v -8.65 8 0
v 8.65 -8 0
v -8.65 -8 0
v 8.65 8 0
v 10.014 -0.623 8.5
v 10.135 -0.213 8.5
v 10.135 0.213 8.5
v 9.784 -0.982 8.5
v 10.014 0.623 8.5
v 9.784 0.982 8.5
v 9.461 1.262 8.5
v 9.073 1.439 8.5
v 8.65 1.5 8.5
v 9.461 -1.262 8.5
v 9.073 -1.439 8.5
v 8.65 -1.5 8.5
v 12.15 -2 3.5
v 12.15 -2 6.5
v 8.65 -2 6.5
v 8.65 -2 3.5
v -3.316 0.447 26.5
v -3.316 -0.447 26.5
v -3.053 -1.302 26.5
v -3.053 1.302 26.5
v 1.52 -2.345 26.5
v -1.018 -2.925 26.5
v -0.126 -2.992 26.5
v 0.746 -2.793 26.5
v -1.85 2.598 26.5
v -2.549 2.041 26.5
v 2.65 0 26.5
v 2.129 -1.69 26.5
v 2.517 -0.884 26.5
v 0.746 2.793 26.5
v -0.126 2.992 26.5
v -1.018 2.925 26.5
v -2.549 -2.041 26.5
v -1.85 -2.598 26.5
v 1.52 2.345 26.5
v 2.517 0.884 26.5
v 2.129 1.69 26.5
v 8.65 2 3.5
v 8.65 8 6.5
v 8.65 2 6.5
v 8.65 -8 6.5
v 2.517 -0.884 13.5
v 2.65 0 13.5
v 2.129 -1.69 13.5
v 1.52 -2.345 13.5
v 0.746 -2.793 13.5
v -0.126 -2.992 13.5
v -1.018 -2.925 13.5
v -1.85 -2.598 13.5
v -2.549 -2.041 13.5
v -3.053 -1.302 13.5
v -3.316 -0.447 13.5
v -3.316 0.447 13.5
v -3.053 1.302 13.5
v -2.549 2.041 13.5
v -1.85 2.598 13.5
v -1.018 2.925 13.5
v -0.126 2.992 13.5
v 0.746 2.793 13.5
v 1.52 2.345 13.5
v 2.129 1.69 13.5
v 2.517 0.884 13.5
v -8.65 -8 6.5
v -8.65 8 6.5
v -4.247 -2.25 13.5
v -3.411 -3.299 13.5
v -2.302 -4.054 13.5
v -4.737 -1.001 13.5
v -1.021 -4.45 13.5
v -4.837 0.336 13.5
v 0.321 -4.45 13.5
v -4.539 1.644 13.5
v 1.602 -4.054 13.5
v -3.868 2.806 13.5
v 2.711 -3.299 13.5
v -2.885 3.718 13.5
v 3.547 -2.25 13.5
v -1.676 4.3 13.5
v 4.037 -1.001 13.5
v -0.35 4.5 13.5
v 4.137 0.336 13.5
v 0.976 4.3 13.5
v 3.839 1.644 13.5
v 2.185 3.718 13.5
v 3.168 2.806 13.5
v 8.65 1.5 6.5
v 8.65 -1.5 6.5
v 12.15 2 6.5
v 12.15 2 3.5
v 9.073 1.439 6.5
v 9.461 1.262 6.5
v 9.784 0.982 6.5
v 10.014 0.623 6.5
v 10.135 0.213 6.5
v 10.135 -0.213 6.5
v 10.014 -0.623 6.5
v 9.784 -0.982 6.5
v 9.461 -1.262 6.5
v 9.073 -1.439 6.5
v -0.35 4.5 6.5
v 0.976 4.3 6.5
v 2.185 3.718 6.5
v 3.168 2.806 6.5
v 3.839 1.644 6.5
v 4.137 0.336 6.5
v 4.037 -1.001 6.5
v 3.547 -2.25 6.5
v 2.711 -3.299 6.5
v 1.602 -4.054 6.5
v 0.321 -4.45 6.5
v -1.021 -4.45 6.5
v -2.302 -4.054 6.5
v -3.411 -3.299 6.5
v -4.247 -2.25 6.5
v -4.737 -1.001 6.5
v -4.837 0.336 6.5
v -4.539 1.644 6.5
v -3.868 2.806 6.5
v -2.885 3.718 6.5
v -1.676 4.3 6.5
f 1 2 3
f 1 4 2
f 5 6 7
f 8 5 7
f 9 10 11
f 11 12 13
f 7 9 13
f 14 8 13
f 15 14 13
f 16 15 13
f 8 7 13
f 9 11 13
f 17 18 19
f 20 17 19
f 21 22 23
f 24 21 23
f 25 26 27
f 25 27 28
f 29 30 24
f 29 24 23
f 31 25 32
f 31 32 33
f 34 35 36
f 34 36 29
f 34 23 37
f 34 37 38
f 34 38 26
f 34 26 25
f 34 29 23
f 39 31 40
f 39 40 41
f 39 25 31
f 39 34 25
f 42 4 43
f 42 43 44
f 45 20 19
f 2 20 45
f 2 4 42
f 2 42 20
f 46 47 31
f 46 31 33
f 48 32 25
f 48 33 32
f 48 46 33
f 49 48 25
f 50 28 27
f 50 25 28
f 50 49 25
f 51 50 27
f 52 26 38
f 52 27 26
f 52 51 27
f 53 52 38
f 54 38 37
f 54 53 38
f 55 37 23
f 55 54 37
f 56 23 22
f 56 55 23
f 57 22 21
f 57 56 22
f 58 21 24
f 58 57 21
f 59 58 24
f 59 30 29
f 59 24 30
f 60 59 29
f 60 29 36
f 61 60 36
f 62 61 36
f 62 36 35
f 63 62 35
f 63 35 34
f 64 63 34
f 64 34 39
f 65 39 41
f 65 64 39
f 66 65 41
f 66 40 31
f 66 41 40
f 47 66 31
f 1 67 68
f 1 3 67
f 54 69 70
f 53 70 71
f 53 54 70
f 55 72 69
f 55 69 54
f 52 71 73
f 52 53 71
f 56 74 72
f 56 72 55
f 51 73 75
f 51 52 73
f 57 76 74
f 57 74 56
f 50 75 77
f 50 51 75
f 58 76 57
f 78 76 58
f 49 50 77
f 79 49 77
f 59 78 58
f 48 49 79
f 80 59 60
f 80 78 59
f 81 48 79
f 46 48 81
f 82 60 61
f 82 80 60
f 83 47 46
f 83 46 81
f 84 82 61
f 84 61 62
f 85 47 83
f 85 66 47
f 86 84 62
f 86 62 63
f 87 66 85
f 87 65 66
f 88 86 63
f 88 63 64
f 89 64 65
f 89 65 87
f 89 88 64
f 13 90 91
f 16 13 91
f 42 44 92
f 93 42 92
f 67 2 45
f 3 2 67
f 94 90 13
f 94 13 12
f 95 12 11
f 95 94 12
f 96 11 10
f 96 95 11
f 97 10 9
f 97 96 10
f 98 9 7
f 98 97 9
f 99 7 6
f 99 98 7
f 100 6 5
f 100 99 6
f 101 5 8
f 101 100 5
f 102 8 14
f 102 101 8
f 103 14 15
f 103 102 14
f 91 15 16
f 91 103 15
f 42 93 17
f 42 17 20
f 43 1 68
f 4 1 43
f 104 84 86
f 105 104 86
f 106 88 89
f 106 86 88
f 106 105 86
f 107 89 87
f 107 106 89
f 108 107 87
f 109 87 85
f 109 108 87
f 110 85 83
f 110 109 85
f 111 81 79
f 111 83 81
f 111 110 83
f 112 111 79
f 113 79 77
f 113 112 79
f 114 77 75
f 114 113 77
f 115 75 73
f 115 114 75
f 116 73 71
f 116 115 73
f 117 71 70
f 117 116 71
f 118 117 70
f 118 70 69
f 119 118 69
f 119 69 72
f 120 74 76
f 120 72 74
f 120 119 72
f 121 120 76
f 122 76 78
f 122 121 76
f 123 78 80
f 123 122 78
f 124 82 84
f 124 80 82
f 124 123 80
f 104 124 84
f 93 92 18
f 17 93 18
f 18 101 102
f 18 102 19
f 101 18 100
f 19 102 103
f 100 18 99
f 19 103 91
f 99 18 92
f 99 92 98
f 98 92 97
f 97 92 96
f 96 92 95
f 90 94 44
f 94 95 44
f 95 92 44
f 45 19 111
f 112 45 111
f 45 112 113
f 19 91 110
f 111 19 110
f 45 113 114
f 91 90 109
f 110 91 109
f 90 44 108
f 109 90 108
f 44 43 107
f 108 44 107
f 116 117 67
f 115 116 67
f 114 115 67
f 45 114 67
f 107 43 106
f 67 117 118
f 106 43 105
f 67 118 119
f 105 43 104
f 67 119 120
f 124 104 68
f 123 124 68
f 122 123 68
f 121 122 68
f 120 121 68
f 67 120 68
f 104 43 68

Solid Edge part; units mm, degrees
sketch "Sketch1" plane through (0, 0, 0) normal (0, 0, 1) x (1, 0, 0)
  line L0 (8.65, -8) -> (-8.65, -8)
  line L1 (-8.65, -8) -> (-8.65, 8)
  line L2 (-8.65, 8) -> (8.65, 8)
  line L3 (8.65, 8) -> (8.65, -8)
  dimension "D1" = 17.3
  dimension "D2" = 16
extrude "Protrusion1" add sketch "Sketch1" along normal blind 6.5
sketch "Sketch2" plane through (0, 0, 6.5) normal (0, 0, 1) x (0, 1, 0)
  circle A0 centre (0, 0.35) radius 4.5
  dimension "D1" = 8.3
extrude "ExtrudedProtrusion_2" add sketch "Sketch2" along normal blind 7
sketch "Sketch3" plane through (0, 0, 6.5) normal (0, 0, 1) x (1, 0, 0)
  line L0 (8.65, 2) -> (12.15, 2)
  line L1 (12.15, 2) -> (12.15, -2)
  line L2 (12.15, -2) -> (8.65, -2)
  line L3 (8.65, -2) -> (8.65, 2)
  dimension "D1" = 4
  dimension "D2" = 12.5
extrude "ExtrudedProtrusion_3" add sketch "Sketch3" against normal blind 3
sketch "Sketch4" plane through (1.75, 0, 6.5) normal (0, 0, 1) x (1, 0, 0)
  arc A0 (6.9, 1.5) -> (6.9, -1.5) centre (6.9, 0) cw
  line L0 (6.9, 1.5) -> (6.9, -1.5)
  dimension "D1" = 1.5
  dimension "D2" = 9
extrude "ExtrudedProtrusion_4" add sketch "Sketch4" along normal blind 2
sketch "Sketch5" plane through (-0.35, 0, 13.5) normal (0, 0, 1) x (1, 0, 0)
  circle A0 centre (0, 0) radius 3
extrude "ExtrudedProtrusion_5" add sketch "Sketch5" along normal blind 13
